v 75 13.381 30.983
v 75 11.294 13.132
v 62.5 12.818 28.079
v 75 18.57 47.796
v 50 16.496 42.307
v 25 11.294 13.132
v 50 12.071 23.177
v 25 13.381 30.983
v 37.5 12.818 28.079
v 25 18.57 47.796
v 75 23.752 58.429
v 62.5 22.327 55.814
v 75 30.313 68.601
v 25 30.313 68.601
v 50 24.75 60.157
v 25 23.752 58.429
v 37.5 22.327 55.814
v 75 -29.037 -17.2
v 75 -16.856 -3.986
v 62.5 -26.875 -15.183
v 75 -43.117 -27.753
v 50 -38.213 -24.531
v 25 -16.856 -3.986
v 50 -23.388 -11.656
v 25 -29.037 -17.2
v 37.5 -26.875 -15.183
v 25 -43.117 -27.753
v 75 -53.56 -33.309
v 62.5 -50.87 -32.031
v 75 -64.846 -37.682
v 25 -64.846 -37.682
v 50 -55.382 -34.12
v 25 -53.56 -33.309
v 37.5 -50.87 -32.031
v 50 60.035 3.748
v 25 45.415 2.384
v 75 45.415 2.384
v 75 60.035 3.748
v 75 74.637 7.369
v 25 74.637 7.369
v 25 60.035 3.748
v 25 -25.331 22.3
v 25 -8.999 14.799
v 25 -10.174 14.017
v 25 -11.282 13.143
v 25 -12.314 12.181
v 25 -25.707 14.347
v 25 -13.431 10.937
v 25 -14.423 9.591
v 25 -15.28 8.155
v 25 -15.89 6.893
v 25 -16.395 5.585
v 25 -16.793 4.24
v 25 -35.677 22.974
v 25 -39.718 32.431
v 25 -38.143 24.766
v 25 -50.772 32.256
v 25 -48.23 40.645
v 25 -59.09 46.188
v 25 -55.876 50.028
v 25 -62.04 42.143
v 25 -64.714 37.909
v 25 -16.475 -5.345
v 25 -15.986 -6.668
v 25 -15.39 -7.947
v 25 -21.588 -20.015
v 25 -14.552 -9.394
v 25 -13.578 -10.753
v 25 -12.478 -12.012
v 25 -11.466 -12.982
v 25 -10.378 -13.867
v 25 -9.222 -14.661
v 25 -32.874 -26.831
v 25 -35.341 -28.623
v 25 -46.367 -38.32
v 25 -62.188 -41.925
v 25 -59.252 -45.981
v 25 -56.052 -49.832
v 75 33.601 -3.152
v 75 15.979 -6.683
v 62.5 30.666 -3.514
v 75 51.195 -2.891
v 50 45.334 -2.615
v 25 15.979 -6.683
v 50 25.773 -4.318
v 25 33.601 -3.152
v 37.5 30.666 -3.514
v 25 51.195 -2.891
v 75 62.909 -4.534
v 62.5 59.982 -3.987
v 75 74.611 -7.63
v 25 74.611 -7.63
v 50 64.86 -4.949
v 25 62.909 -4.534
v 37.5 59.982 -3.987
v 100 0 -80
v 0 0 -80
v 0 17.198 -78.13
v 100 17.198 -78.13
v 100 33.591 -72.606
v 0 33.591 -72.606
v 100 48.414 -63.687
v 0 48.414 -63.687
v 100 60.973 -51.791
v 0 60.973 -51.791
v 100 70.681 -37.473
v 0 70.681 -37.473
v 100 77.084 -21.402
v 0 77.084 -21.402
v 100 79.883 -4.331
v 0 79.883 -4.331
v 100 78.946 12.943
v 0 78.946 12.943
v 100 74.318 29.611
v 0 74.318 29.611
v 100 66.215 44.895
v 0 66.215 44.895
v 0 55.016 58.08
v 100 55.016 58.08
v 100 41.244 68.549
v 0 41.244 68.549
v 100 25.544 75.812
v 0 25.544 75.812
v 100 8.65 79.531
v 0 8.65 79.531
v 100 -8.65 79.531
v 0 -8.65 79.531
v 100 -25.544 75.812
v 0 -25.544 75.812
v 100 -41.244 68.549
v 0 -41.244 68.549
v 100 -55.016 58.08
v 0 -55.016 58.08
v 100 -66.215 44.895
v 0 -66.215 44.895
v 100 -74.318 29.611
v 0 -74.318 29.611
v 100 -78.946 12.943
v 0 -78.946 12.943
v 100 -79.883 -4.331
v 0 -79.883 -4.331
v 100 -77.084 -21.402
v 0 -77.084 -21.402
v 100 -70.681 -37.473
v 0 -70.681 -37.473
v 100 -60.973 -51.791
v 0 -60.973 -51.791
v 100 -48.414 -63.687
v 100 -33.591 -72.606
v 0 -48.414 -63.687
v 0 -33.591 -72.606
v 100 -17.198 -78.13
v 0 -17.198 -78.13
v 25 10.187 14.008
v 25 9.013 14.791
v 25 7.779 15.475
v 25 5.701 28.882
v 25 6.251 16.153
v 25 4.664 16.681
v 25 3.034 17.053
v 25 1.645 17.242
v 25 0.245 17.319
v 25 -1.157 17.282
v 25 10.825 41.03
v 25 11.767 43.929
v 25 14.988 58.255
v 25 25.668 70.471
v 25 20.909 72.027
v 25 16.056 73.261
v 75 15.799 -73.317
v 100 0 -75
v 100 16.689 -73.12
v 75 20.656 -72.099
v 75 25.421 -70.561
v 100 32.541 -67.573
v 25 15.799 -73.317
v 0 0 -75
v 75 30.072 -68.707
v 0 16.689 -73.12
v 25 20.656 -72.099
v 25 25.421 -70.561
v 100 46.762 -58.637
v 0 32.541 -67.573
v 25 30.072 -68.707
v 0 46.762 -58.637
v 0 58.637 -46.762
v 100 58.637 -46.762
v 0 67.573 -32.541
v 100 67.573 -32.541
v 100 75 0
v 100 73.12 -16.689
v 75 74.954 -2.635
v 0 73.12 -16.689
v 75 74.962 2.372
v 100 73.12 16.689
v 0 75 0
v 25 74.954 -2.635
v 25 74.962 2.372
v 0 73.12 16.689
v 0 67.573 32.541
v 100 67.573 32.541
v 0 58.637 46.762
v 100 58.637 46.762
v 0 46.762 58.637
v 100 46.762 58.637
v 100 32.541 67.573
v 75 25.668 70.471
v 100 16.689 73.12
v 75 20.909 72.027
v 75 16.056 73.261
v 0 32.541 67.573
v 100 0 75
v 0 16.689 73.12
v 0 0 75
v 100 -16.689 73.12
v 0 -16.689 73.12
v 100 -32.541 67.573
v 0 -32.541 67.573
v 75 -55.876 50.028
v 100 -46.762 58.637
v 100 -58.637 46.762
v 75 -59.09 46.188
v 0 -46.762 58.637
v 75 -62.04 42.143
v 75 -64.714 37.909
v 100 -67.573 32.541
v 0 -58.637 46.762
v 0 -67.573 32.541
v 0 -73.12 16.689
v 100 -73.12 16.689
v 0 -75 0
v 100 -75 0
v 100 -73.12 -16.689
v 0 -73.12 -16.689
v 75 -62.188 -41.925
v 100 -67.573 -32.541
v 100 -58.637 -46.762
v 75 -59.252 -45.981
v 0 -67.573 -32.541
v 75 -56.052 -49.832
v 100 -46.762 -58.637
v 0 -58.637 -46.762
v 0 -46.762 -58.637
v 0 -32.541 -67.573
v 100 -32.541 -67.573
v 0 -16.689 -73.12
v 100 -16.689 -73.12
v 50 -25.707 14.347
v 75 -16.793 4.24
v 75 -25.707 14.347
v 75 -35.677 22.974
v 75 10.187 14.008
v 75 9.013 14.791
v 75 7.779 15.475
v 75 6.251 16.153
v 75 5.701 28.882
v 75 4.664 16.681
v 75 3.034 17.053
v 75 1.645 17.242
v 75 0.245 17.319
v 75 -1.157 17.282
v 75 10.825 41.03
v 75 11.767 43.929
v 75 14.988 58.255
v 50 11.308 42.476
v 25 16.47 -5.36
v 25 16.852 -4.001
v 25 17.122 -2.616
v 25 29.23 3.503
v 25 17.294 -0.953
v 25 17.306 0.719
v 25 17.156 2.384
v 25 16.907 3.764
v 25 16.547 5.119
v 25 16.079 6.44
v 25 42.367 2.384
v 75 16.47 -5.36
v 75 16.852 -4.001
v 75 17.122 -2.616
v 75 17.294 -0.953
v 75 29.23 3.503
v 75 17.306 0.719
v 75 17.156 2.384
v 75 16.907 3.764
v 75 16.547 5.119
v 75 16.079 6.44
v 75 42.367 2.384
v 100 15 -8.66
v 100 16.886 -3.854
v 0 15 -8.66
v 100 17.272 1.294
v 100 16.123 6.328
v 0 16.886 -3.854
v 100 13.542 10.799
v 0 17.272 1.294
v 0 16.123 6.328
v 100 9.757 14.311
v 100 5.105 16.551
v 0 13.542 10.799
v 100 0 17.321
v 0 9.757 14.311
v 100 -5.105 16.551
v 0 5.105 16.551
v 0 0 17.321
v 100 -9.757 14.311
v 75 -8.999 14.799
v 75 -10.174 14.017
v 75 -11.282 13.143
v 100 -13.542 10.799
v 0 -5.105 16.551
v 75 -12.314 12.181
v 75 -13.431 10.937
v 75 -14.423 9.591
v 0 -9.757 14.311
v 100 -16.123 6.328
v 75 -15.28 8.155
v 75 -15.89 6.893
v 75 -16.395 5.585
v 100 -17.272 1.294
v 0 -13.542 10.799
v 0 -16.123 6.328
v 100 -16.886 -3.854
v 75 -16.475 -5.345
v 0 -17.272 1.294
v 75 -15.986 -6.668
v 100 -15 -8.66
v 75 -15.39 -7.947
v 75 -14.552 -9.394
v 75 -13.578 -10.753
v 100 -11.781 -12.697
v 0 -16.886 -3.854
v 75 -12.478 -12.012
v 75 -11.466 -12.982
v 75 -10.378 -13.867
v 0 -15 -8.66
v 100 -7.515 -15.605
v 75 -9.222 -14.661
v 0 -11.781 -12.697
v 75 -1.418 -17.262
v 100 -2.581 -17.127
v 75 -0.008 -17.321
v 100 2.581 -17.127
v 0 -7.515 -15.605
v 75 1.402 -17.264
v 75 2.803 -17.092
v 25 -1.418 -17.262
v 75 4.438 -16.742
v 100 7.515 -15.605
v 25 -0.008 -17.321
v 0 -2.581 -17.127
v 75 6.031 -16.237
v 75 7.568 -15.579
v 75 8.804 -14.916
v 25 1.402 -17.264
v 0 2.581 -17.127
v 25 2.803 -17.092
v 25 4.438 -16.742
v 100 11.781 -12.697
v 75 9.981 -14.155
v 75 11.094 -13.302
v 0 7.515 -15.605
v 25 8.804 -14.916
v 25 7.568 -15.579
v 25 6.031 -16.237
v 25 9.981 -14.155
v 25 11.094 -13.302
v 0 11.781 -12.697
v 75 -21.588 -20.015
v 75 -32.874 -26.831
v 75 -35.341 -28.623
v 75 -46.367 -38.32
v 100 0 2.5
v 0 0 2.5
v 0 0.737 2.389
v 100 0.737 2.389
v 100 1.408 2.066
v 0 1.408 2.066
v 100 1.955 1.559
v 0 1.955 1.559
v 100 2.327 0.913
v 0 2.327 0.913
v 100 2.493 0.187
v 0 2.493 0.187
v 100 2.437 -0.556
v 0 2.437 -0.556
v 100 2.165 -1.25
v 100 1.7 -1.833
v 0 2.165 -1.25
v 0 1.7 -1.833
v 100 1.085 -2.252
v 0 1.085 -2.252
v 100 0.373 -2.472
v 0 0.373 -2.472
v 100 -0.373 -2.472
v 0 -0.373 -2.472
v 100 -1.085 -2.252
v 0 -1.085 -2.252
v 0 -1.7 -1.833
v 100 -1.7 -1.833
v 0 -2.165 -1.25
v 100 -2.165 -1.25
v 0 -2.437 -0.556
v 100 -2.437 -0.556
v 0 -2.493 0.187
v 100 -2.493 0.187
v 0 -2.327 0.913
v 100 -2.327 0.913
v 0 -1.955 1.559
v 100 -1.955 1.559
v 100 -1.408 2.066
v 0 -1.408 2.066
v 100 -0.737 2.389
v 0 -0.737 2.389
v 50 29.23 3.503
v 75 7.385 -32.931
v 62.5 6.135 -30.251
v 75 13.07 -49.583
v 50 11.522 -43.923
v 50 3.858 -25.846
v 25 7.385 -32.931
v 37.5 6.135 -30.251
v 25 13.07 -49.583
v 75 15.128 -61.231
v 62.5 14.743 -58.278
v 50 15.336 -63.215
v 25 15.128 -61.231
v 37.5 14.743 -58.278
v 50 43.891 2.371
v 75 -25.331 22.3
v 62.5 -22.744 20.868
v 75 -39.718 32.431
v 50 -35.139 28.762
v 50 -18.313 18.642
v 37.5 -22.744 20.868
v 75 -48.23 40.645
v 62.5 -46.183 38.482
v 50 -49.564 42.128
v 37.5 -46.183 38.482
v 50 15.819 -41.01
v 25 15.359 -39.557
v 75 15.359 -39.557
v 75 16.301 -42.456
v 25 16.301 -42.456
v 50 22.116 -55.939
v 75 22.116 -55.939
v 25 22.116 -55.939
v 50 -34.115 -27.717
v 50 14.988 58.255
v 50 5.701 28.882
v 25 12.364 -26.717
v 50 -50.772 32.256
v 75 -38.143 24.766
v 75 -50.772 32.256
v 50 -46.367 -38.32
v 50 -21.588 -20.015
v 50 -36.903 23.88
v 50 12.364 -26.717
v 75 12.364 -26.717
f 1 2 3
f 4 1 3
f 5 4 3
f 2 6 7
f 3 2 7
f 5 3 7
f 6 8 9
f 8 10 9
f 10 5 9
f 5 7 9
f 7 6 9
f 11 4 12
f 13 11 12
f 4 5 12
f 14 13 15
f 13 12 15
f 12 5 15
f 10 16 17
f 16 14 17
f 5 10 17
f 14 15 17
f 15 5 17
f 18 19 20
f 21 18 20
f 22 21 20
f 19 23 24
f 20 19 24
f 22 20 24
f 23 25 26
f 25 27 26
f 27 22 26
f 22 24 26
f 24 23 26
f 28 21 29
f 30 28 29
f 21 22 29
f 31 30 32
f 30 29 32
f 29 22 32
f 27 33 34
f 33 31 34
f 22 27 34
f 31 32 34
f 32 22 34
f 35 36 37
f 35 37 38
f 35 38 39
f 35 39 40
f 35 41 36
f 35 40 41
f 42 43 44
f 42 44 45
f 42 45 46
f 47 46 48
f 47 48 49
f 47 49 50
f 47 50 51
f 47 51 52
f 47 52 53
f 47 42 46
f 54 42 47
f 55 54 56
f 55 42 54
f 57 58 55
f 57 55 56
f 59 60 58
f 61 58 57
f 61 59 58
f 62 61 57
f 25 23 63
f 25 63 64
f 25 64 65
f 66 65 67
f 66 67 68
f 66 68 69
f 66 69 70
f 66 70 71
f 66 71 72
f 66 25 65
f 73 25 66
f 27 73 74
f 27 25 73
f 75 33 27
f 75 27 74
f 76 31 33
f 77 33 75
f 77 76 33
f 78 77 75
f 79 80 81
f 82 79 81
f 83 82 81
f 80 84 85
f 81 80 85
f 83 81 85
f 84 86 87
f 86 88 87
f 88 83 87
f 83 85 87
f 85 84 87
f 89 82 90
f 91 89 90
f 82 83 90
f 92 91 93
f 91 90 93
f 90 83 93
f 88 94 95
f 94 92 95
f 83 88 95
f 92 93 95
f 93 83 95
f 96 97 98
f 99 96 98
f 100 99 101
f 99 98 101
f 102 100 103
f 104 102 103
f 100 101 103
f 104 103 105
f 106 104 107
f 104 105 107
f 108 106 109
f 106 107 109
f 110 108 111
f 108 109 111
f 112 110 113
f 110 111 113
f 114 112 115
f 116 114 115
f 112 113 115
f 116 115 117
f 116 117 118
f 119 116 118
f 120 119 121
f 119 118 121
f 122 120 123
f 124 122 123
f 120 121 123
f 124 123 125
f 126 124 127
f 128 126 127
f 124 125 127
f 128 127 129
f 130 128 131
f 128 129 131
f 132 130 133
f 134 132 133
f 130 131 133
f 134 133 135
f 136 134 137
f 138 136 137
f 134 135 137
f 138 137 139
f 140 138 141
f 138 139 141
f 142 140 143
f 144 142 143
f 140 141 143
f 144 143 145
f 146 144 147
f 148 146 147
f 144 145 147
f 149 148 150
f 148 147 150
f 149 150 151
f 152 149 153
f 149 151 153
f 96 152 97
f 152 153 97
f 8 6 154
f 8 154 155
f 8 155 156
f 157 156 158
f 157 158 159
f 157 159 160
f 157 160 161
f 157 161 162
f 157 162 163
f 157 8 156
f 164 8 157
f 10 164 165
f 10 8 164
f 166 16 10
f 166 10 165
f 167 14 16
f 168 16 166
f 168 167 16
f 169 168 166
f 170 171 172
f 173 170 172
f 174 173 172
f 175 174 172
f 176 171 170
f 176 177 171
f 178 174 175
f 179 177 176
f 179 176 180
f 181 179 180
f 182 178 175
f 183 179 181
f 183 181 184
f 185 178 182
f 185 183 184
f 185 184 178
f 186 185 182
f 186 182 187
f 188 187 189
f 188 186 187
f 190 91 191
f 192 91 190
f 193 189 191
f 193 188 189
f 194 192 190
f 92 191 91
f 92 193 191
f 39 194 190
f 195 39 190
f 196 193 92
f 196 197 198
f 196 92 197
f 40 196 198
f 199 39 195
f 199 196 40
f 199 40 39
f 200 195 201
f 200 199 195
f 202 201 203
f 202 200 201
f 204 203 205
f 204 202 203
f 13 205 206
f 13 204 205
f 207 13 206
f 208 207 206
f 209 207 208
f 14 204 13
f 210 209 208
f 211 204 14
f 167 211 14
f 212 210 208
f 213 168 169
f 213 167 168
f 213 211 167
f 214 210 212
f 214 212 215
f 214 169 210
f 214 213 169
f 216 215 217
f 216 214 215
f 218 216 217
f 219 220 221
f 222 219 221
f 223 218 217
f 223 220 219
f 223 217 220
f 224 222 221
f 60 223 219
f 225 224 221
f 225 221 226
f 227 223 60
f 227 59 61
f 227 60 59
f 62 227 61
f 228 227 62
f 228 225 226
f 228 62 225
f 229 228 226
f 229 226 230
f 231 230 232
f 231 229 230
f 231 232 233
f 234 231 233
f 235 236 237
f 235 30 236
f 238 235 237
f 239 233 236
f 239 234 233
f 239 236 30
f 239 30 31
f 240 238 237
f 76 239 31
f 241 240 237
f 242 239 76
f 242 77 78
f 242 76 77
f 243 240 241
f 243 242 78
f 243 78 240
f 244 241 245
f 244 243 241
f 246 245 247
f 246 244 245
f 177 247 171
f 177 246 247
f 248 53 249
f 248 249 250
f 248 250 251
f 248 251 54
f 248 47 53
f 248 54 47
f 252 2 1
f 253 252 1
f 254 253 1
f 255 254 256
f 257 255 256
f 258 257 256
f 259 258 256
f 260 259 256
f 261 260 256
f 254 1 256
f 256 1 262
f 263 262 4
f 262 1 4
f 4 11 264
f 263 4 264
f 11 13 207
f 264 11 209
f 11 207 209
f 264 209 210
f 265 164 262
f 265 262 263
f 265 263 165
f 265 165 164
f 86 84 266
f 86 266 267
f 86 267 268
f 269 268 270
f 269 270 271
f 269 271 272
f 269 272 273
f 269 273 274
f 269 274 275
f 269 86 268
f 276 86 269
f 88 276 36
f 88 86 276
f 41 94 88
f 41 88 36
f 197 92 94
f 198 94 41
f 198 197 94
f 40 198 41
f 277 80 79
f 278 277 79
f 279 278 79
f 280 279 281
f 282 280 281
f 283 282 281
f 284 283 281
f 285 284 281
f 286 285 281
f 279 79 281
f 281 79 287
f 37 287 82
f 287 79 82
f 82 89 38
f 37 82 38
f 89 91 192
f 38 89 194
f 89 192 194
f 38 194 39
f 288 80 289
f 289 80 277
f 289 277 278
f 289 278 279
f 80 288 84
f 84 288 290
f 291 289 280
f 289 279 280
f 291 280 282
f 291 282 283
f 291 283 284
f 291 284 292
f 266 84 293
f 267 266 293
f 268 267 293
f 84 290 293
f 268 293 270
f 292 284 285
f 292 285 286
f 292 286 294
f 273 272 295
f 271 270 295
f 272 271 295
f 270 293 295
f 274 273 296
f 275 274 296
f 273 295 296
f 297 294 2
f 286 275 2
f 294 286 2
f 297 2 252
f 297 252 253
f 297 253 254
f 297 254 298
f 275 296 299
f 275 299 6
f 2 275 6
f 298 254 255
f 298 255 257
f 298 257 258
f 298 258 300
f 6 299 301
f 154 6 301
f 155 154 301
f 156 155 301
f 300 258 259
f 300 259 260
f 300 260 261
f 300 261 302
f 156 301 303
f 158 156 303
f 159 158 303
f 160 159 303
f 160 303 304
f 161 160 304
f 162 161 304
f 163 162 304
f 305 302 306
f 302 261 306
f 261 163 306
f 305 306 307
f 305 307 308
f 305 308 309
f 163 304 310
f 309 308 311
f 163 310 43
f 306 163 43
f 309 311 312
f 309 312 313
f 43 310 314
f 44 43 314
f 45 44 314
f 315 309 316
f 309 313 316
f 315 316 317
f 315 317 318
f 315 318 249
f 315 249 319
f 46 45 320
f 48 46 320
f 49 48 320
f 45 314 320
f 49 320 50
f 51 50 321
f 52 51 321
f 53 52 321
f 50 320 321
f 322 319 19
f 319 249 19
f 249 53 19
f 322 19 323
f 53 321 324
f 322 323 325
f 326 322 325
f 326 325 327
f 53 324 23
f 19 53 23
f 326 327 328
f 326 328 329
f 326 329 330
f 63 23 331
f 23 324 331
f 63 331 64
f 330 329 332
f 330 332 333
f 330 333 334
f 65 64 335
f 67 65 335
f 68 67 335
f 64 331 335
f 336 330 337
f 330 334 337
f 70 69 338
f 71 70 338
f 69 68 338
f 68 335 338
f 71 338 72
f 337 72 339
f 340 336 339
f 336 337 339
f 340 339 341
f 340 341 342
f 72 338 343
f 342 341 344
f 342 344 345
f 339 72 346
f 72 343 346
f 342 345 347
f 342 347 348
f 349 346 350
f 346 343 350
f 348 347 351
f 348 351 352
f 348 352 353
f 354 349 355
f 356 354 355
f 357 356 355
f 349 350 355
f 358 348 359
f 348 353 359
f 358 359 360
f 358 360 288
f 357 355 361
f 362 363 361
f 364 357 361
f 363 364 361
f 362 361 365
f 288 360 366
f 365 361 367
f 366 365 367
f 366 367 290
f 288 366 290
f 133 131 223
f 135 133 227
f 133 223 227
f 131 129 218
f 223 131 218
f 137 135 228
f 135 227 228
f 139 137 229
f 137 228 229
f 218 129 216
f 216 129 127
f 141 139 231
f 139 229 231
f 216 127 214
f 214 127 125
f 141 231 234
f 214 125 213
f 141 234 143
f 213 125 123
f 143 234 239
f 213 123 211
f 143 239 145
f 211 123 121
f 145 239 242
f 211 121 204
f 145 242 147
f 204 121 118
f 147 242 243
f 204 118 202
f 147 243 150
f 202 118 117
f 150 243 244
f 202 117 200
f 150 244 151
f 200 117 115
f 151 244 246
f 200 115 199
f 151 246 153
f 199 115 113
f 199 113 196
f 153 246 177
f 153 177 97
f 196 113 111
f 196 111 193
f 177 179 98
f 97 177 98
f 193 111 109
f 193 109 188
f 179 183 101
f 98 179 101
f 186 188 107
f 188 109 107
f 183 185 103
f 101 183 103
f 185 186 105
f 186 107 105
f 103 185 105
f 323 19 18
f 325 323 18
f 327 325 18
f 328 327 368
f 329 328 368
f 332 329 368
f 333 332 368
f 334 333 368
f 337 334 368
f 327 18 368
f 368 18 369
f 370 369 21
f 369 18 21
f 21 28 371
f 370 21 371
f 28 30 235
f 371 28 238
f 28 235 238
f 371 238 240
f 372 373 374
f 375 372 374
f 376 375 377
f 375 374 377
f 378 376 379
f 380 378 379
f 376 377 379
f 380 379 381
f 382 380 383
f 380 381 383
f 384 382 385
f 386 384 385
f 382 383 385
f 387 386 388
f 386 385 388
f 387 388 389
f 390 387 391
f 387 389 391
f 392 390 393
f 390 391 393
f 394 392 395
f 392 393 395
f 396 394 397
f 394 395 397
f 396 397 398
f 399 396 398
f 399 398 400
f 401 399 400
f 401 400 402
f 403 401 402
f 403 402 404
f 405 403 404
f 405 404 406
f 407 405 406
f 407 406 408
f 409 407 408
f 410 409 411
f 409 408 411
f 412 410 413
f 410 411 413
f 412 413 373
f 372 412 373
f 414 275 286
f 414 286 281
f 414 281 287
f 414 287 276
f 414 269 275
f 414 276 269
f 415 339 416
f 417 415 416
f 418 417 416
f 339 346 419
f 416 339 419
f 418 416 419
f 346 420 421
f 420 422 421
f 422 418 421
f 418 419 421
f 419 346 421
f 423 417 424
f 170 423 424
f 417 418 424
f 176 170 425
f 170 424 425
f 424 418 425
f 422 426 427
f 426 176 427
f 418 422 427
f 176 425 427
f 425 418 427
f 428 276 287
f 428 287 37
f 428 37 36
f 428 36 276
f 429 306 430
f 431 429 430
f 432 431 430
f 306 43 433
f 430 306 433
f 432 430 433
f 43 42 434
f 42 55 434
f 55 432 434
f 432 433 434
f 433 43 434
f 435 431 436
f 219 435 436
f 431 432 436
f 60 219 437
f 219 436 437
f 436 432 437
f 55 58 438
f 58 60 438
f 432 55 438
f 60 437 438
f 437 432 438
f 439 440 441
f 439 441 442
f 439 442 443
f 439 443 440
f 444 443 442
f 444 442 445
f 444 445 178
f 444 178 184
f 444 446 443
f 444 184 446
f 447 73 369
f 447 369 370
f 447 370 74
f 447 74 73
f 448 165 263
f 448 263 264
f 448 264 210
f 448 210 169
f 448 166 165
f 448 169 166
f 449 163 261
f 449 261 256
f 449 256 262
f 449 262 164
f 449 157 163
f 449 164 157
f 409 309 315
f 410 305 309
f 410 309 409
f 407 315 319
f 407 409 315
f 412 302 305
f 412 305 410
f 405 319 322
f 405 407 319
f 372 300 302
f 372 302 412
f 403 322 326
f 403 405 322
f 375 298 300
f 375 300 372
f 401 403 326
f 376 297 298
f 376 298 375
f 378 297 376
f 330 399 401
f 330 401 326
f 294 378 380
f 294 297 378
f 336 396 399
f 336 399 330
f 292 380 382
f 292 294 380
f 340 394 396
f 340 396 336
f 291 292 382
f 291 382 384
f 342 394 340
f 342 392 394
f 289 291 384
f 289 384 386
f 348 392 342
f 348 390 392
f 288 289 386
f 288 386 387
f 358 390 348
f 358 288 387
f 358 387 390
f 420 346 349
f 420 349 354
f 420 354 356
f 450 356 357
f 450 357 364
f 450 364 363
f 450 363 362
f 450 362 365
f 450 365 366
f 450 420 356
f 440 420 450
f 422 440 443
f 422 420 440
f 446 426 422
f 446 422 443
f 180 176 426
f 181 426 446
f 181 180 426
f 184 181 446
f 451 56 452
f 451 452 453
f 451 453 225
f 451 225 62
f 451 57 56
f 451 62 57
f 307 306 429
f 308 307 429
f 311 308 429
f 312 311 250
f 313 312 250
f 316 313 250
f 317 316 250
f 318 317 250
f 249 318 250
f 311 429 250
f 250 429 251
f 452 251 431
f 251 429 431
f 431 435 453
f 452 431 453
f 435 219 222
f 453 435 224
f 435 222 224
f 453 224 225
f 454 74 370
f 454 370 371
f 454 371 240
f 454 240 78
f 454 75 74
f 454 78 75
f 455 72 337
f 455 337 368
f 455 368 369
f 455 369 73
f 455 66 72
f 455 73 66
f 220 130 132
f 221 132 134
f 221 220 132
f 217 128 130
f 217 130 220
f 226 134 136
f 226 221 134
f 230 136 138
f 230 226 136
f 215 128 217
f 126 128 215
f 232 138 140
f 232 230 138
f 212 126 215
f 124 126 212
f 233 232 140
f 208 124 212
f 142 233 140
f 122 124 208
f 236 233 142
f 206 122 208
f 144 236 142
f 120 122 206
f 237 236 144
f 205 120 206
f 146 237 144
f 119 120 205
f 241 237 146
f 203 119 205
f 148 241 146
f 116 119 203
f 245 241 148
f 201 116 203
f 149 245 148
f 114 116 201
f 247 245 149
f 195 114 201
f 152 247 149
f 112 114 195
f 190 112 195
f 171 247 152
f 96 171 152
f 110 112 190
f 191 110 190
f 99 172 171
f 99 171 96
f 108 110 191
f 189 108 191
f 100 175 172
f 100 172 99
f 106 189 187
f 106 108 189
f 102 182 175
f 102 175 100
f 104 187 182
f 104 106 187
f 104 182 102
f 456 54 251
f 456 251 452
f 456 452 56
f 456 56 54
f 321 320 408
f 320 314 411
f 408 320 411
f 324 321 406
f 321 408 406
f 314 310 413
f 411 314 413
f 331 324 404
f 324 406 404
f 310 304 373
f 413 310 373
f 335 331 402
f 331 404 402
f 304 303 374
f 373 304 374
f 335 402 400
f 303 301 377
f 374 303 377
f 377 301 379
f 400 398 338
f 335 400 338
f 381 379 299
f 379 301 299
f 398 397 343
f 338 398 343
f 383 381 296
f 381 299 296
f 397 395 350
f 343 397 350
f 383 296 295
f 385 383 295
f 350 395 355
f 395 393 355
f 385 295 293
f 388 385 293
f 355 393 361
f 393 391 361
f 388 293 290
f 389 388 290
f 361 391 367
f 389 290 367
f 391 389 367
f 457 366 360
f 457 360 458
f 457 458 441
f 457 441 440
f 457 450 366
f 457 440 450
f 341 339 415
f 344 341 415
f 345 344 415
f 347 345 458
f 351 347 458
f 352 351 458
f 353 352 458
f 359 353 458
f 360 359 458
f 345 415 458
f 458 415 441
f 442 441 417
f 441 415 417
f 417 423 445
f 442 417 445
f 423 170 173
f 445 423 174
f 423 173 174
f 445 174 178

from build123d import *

# Parameters (mm, degrees)
SKETCH1_R           = 80
SKETCH1_R_2         = 75
SKETCH1_R_3         = 15
SKETCH1_R_4         = 17.320508076
BOSS_EXTRUDE1_DEPTH = 100
BOSS_EXTRUDE2_START = -25
BOSS_EXTRUDE2_DEPTH = 50
SKETCH6_R           = 2.5
CUT_EXTRUDE1_DEPTH  = 100
CIRPATTERN1_COUNT   = 5


with BuildPart() as part:
    # Sketch1 → Boss-Extrude1 (new body)
    with BuildSketch(Plane(origin=(0, 0, 0), x_dir=(0, 0, -1), z_dir=(1, 0, 0))):
        Circle(SKETCH1_R)
        Circle(SKETCH1_R_2, mode=Mode.SUBTRACT)
        Circle(SKETCH1_R_3)
        Polygon((-17.320508076, 0), (-8.660254038, -15), (8.660254038, -15), (17.320508076, 0), (8.660254038, 15), (-8.660254038, 15), align=None)
        Circle(SKETCH1_R_4)
    extrude(amount=BOSS_EXTRUDE1_DEPTH)

    # Sketch7 → Boss-Extrude2 (add)
    with BuildSketch(Plane.ZY.offset(BOSS_EXTRUDE2_START)):
        with BuildLine():
            add(Edge.make_bspline(
                [(6.440327224, 16.078625105), (2.594720076, 29.237330687), (2.383712029, 42.366824241)],
                knots=[0.048824519, 0.048824519, 0.048824519, 0.47524405, 0.47524405, 0.47524405], degree=2))
            add(Edge.make_bspline(
                [(2.383712029, 42.366824241), (2.359211722, 43.891299831), (2.383712029, 45.415381593)],
                knots=[0.47524405, 0.47524405, 0.47524405, 0.52475595, 0.52475595, 0.52475595], degree=2))
            add(Edge.make_bspline(
                [(2.383712029, 45.415381593), (2.618880242, 60.044406046), (7.368611427, 74.637146017)],
                knots=[0.52475595, 0.52475595, 0.52475595, 1, 1, 1], degree=2))
            ThreePointArc((7.368611427, 74.637146017), (-0.131481233, 74.999884751), (-7.630255972, 74.610851716))
            add(Edge.make_bspline(
                [(-6.683078321, 15.979251051), (1.926800998, 45.372338084), (-7.630255972, 74.610851716)],
                knots=[0.049553835, 0.049553835, 0.049553835, 1, 1, 1], degree=2))
            ThreePointArc((-6.683078321, 15.979251051), (-4.684644195, 16.674954536), (-2.616287971, 17.121770856))
            ThreePointArc((-2.616287971, 17.121770856), (-0.117518624, 17.320109393), (2.383712029, 17.155696342))
            ThreePointArc((2.383712029, 17.155696342), (4.444765212, 16.740491695), (6.440327224, 16.078625105))
        make_face()
    boss_extrude2 = extrude(amount=-BOSS_EXTRUDE2_DEPTH)

    # Sketch6 → Cut-Extrude1 (cut)
    with BuildSketch(Plane.ZY):
        Circle(SKETCH6_R)
    extrude(amount=-CUT_EXTRUDE1_DEPTH, mode=Mode.SUBTRACT)

    # CirPattern1: Boss-Extrude2 ×5 about axis
    cirpattern1_axis = Axis((100, 0, 0), (-1, 0, 0))
    for i in range(1, CIRPATTERN1_COUNT):
        add(boss_extrude2.rotate(cirpattern1_axis, i * 360 / CIRPATTERN1_COUNT))


solid = part.part
